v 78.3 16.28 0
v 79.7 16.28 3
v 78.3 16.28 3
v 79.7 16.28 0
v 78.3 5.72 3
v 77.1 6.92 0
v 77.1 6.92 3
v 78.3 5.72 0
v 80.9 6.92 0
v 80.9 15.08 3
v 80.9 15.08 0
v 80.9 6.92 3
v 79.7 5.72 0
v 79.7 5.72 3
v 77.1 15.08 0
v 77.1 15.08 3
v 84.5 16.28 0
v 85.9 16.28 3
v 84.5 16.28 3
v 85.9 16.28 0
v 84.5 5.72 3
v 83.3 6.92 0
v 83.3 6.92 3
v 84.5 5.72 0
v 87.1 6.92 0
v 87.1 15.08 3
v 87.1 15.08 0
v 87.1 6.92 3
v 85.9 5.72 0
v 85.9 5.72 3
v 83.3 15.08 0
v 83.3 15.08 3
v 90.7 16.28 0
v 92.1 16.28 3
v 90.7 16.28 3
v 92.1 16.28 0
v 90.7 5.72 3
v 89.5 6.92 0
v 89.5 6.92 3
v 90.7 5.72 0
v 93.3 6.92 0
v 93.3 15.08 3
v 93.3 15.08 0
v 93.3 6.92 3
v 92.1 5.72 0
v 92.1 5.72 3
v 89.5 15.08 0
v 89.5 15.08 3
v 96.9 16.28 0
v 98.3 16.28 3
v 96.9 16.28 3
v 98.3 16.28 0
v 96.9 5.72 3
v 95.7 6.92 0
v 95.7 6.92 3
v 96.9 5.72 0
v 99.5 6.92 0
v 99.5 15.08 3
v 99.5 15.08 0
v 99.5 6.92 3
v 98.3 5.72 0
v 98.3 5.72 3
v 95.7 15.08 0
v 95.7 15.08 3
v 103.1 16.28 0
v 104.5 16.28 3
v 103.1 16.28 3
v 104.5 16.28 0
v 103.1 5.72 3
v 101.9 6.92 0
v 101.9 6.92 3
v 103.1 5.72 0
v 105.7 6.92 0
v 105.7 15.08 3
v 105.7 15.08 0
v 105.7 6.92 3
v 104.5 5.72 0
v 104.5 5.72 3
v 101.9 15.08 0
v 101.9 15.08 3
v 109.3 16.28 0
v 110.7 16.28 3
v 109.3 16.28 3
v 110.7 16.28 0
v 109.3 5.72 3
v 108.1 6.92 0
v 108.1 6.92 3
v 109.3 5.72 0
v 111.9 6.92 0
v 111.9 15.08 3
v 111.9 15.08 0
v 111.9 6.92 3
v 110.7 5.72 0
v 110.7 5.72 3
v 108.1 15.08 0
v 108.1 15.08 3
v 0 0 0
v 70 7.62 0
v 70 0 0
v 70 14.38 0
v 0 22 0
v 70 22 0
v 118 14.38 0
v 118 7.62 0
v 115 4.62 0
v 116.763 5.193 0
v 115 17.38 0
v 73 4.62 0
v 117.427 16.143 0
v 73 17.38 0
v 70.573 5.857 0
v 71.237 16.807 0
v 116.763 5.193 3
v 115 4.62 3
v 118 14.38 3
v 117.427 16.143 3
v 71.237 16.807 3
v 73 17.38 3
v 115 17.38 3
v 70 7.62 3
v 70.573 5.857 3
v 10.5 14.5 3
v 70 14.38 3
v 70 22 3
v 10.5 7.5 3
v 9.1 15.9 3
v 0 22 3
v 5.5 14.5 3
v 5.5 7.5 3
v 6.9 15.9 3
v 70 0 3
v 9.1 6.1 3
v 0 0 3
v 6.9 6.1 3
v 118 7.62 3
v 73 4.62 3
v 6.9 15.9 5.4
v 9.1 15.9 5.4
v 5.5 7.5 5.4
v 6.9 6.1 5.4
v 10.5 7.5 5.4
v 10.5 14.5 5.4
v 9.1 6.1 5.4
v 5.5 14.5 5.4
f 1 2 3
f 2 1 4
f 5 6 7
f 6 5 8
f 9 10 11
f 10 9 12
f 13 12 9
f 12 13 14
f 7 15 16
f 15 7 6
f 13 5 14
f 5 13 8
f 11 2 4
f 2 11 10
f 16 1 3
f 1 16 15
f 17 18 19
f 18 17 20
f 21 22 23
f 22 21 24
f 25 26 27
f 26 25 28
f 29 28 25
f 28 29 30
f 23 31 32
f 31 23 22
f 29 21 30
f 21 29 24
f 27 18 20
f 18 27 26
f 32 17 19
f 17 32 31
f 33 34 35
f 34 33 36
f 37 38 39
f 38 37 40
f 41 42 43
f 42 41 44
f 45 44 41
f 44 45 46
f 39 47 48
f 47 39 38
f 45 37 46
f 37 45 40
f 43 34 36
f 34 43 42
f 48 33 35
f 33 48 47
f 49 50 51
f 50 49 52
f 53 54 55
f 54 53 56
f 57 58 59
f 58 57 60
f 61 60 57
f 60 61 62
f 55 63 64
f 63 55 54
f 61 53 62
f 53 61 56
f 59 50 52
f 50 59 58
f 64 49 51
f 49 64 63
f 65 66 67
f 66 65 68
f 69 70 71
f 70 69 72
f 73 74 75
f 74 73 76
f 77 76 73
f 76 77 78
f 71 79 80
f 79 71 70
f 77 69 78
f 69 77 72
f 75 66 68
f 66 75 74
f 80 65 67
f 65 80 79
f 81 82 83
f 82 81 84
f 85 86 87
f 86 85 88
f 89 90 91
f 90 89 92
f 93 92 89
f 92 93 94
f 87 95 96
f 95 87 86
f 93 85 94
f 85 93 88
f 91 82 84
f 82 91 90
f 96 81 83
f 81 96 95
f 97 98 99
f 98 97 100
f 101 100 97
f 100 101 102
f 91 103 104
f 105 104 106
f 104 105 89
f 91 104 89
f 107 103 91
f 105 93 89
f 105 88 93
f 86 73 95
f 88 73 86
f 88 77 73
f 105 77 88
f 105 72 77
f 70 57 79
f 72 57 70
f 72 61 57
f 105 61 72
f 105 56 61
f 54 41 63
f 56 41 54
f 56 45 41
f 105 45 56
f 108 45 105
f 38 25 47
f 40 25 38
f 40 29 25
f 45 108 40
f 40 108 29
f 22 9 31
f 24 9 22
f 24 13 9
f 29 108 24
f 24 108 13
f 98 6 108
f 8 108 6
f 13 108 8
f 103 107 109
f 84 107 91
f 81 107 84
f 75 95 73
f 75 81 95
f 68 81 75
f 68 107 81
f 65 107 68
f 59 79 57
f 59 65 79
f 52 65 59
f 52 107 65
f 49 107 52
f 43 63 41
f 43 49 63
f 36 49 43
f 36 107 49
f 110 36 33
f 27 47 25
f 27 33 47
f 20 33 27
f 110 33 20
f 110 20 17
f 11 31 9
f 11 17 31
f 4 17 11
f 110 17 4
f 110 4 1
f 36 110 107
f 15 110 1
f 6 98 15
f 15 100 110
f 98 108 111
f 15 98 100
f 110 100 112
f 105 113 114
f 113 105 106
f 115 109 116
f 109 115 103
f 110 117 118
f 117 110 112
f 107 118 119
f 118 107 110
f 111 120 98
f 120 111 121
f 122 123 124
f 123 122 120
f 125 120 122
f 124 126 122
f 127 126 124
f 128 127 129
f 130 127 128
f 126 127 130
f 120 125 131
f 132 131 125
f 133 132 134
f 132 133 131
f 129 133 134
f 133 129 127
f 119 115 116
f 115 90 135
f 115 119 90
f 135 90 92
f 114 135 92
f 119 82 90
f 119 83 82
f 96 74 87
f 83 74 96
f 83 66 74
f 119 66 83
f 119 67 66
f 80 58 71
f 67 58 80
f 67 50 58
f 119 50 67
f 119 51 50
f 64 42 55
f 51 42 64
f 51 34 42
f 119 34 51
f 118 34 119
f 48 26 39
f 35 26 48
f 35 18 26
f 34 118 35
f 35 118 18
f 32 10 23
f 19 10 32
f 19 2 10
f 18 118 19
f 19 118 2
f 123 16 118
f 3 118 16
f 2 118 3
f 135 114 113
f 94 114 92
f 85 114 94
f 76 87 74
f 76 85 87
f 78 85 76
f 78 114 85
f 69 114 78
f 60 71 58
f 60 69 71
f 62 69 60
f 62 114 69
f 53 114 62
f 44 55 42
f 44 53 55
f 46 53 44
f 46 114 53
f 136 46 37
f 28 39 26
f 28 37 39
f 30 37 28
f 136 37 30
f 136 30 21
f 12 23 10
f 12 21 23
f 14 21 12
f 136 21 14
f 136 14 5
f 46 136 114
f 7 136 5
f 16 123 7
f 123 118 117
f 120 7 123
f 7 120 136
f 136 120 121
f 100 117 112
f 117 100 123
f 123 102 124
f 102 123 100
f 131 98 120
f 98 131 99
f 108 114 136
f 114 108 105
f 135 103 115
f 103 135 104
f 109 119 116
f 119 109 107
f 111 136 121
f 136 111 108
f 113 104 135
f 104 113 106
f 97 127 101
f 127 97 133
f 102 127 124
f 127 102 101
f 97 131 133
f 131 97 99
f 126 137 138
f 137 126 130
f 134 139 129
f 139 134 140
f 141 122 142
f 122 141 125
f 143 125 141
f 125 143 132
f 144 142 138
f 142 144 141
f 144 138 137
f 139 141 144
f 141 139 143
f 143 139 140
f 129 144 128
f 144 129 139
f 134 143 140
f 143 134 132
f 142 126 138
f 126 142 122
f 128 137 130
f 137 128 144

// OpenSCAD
// latches/ladder_strap.scad — adjustable ladder slots over a low catch.
// MIT licensed.
//
// Closure idea: stretch one of the ladder slots over the low catch block.
// This trades elegance for easy adjustability and fast print-test feedback.

LADDER_CATCH_INSET    = 8;
LADDER_CATCH_L        = 5.0;
LADDER_CATCH_HEIGHT   = 2.4;
LADDER_TAB_LENGTH     = 48;
LADDER_TAB_WIDTH_FR   = 0.58;
LADDER_SLOT_COUNT     = 6;
LADDER_SLOT_START_X   = 9;
LADDER_SLOT_SPACING   = 6.2;
LADDER_SLOT_L         = 3.8;
LADDER_SLOT_W         = 10.8;

module _ladder_round_rect_2d(length, width, radius) {
    offset(r = radius) offset(delta = -radius)
        square([length, width], center = false);
}

module _ladder_catch(band_width, band_thickness) {
    catch_w = min(LADDER_SLOT_W - 1.0, band_width - 6);
    translate([
        LADDER_CATCH_INSET - LADDER_CATCH_L / 2,
        (band_width - catch_w) / 2,
        band_thickness
    ])
        linear_extrude(height = LADDER_CATCH_HEIGHT)
            _ladder_round_rect_2d(LADDER_CATCH_L, catch_w, 1.4);
}

module _ladder_tab(band_width, band_thickness) {
    tab_w = min(band_width * LADDER_TAB_WIDTH_FR, band_width - 5);
    y0 = (band_width - tab_w) / 2;
    slot_w = min(LADDER_SLOT_W, tab_w - 2.2);

    translate([0, y0, 0])
        difference() {
            linear_extrude(height = band_thickness)
                _ladder_round_rect_2d(LADDER_TAB_LENGTH, tab_w, 3);

            for (i = [0 : LADDER_SLOT_COUNT - 1])
                translate([
                    LADDER_SLOT_START_X + i * LADDER_SLOT_SPACING - LADDER_SLOT_L / 2,
                    (tab_w - slot_w) / 2,
                    -0.1
                ])
                    linear_extrude(height = band_thickness + 0.2)
                        _ladder_round_rect_2d(LADDER_SLOT_L, slot_w, 1.2);
        }
}

module latch_ladder_strap(band_width, band_thickness, end = "both") {
    if (end == "left" || end == "both")
        _ladder_catch(band_width, band_thickness);

    if (end == "right" || end == "both")
        _ladder_tab(band_width, band_thickness);
}

// development render
translate([0, 0, 0]) cube([70, 22, 3]);
latch_ladder_strap(22, 3, end = "left");
translate([70, 0, 0]) latch_ladder_strap(22, 3, end = "right");
